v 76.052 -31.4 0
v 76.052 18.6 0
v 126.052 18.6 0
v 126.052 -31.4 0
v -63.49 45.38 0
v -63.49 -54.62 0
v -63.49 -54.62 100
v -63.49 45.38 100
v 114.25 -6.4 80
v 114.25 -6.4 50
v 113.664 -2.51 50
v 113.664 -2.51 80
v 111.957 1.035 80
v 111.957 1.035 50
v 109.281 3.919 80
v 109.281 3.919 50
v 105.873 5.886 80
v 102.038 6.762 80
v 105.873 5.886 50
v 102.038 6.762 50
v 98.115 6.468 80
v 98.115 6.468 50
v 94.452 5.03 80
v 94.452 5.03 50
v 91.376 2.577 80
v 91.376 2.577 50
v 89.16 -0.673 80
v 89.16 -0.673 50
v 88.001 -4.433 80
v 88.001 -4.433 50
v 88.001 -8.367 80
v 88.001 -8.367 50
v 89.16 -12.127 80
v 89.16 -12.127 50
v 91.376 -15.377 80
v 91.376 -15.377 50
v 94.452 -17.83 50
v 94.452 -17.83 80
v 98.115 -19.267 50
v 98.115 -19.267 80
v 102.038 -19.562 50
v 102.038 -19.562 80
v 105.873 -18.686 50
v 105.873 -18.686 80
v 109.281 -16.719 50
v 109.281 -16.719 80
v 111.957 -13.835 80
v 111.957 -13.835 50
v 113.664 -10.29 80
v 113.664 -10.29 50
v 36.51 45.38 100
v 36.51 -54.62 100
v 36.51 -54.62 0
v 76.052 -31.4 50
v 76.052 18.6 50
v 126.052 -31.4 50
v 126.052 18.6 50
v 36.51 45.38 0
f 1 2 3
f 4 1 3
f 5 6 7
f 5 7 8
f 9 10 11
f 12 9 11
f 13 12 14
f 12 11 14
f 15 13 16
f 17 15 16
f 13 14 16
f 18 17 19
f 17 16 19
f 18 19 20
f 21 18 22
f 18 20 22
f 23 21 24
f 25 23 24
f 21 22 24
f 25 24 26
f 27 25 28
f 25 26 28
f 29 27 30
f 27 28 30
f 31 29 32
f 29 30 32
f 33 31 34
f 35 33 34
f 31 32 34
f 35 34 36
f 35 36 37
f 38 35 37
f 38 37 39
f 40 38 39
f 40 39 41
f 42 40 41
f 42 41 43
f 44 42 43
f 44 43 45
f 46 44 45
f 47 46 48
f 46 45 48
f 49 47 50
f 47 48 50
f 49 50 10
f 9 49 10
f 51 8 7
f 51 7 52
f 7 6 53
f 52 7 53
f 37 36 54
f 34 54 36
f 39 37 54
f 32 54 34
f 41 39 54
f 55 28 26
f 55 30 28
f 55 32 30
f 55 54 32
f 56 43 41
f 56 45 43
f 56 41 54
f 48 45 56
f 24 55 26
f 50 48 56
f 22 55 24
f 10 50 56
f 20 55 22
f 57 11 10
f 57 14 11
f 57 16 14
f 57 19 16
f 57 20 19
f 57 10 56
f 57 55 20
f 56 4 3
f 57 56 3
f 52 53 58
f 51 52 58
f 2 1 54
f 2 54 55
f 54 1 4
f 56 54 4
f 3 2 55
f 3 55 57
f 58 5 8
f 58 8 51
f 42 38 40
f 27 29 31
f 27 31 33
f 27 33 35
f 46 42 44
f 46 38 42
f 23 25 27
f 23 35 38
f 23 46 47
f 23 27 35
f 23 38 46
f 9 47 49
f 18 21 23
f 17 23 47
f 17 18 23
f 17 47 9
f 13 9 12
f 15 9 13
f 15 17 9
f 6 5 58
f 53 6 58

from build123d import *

# Parameters (mm, degrees)
F0_W     = 100
F0_H     = 100
F1_DEPTH = 100
F2_W     = 50
F2_H     = 50
F3_DEPTH = 50
F4_R     = 13.198437
F5_DEPTH = 30


with BuildPart() as f1:
    # F0 (on Top) → F1 (new body)
    with BuildSketch(Plane.XY):
        with Locations((-13.490276, -4.6203)):
            Rectangle(F0_W, F0_H)
    extrude(amount=F1_DEPTH)


with BuildPart() as f3:
    # F2 (on Top) → F3 (new body)
    with BuildSketch(Plane.XY):
        with Locations((101.051537, -6.399972)):
            Rectangle(F2_W, F2_H)
    extrude(amount=F3_DEPTH)

    # F4 (on face) → F5 (join)
    with BuildSketch(Plane.XY.offset(50)):
        with Locations((101.051537, -6.399972)):
            Circle(F4_R)
    extrude(amount=F5_DEPTH)


solid = Compound([f1.part, f3.part])
